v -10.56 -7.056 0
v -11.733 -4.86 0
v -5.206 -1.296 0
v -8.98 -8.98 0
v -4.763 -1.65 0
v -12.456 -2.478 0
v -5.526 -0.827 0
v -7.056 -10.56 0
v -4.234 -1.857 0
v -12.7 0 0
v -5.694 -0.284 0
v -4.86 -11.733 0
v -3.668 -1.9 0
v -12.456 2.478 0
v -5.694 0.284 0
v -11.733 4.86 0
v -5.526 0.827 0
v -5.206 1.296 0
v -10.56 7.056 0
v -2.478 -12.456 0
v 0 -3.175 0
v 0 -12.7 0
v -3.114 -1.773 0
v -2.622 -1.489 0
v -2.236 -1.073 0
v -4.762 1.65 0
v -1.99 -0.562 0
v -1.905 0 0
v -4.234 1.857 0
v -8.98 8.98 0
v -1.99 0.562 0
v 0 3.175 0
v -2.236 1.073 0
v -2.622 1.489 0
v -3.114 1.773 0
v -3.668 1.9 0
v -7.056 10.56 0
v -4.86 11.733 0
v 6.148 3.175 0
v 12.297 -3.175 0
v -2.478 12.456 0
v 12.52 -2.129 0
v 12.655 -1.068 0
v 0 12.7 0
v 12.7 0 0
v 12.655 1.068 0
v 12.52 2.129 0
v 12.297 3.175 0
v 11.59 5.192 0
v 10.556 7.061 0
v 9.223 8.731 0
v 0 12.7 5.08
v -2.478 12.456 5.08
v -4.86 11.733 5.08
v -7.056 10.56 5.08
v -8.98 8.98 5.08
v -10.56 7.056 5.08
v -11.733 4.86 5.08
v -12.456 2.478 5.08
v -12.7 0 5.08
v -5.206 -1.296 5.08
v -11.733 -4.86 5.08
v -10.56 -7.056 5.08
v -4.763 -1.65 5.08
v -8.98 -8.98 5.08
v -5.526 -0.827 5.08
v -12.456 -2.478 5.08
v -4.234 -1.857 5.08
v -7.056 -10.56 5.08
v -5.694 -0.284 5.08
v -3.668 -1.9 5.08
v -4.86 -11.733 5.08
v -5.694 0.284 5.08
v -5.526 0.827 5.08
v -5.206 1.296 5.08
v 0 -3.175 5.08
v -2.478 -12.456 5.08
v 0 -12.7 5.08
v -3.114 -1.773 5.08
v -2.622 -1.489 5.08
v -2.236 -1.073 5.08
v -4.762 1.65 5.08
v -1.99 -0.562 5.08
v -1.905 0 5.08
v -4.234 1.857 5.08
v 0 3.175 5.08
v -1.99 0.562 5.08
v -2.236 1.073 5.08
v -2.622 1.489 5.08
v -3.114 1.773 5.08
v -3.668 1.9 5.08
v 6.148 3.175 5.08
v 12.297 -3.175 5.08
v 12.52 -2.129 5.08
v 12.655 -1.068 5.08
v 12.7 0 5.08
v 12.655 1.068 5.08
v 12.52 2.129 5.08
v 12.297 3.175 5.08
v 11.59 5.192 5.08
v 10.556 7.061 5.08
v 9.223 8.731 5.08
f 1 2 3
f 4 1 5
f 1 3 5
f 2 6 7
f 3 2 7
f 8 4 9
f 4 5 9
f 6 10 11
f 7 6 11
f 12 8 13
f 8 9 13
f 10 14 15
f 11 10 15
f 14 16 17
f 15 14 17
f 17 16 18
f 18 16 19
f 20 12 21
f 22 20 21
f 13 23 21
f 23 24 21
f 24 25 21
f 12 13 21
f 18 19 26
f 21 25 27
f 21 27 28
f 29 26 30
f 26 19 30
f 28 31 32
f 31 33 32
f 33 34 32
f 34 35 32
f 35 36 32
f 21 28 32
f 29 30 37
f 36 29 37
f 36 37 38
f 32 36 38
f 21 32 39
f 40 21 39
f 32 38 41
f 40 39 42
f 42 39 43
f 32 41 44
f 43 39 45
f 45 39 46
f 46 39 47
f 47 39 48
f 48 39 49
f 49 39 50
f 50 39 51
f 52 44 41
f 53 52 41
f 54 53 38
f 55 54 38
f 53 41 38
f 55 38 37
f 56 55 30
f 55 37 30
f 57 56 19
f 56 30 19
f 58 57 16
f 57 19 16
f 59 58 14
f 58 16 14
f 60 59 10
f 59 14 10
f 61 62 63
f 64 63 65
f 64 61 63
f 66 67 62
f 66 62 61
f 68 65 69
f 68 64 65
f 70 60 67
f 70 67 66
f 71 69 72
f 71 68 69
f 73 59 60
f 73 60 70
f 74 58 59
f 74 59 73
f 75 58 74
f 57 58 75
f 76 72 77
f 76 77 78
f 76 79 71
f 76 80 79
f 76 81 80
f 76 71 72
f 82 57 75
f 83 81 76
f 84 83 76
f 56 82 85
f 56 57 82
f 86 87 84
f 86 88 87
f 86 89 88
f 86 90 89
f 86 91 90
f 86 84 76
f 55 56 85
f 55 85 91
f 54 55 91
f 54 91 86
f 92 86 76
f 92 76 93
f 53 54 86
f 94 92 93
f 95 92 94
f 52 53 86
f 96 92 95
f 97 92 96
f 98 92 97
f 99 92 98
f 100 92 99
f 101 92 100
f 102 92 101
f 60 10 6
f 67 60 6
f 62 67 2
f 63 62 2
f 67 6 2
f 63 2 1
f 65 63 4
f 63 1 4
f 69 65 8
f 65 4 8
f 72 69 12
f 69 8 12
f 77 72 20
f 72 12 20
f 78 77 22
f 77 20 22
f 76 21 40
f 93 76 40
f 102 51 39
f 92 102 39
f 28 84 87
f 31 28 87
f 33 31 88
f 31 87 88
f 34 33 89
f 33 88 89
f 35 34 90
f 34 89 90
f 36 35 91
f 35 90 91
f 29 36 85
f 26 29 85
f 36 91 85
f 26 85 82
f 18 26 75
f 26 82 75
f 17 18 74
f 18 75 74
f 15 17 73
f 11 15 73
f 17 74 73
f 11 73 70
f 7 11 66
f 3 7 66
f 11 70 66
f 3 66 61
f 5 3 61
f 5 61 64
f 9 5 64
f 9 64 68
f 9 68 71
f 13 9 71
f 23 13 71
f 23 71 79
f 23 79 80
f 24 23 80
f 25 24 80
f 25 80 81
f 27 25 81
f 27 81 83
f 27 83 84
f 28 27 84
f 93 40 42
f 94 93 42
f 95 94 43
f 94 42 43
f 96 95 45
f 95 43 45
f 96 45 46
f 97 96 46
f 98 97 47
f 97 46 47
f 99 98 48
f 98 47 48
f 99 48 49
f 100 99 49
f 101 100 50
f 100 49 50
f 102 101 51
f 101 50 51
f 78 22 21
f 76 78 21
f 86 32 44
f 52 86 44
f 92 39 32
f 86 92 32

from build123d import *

# Parameters (mm, degrees)
F1_DEPTH = 5.08
F2_R     = 1.905
F3_DEPTH = 5.081


with BuildPart() as f1:
    # F0 (on Top) → F1 (new body)
    with BuildSketch(Plane.XY):
        with BuildLine():
            Line((0, 0), (12.7, 0))
            ThreePointArc((12.7, 0), (12.5987771426, 1.6002545145), (12.2967221242, 3.175))
            Line((12.2967221242, 3.175), (6.1483610621, 3.175))
            Line((6.1483610621, 3.175), (0, 3.175))
            Line((0, 3.175), (0, 0))
        make_face()
        with BuildLine():
            ThreePointArc((12.2967221242, -3.175), (12.5987771426, -1.6002545145), (12.7, 0))
            Line((12.7, 0), (0, 0))
            Line((0, 0), (0, -3.175))
            Line((0, -3.175), (6.1483610621, -3.175))
            Line((6.1483610621, -3.175), (12.2967221242, -3.175))
        make_face()
        with BuildLine():
            Line((6.1483610621, 3.175), (12.2967221242, 3.175))
            ThreePointArc((12.2967221242, 3.175), (11.1125, 6.1483610621), (9.2225415932, 8.73125))
            Line((9.2225415932, 8.73125), (6.1483610621, 3.175))
        make_face()
        with BuildLine():
            Line((-12.7, 0), (0, 0))
            Line((0, 0), (0, 3.175))
            Line((0, 3.175), (0, 6.35))
            Line((0, 6.35), (0, 12.7))
            ThreePointArc((0, 12.7), (-8.9802561211, 8.9802561211), (-12.7, 0))
        make_face()
        with BuildLine():
            Line((0, -3.175), (0, 0))
            Line((0, 0), (-12.7, 0))
            ThreePointArc((-12.7, 0), (-8.9802561211, -8.9802561211), (0, -12.7))
            Line((0, -12.7), (0, -6.35))
            Line((0, -6.35), (0, -3.175))
        make_face()
    extrude(amount=F1_DEPTH)

    # F2 (on face) → F3 (cut, through all)
    with BuildSketch(Plane.XY.offset(5.08)):
        with Locations((-3.81, 0)):
            Circle(F2_R)
    extrude(amount=-F3_DEPTH, mode=Mode.SUBTRACT)


solid = f1.part
